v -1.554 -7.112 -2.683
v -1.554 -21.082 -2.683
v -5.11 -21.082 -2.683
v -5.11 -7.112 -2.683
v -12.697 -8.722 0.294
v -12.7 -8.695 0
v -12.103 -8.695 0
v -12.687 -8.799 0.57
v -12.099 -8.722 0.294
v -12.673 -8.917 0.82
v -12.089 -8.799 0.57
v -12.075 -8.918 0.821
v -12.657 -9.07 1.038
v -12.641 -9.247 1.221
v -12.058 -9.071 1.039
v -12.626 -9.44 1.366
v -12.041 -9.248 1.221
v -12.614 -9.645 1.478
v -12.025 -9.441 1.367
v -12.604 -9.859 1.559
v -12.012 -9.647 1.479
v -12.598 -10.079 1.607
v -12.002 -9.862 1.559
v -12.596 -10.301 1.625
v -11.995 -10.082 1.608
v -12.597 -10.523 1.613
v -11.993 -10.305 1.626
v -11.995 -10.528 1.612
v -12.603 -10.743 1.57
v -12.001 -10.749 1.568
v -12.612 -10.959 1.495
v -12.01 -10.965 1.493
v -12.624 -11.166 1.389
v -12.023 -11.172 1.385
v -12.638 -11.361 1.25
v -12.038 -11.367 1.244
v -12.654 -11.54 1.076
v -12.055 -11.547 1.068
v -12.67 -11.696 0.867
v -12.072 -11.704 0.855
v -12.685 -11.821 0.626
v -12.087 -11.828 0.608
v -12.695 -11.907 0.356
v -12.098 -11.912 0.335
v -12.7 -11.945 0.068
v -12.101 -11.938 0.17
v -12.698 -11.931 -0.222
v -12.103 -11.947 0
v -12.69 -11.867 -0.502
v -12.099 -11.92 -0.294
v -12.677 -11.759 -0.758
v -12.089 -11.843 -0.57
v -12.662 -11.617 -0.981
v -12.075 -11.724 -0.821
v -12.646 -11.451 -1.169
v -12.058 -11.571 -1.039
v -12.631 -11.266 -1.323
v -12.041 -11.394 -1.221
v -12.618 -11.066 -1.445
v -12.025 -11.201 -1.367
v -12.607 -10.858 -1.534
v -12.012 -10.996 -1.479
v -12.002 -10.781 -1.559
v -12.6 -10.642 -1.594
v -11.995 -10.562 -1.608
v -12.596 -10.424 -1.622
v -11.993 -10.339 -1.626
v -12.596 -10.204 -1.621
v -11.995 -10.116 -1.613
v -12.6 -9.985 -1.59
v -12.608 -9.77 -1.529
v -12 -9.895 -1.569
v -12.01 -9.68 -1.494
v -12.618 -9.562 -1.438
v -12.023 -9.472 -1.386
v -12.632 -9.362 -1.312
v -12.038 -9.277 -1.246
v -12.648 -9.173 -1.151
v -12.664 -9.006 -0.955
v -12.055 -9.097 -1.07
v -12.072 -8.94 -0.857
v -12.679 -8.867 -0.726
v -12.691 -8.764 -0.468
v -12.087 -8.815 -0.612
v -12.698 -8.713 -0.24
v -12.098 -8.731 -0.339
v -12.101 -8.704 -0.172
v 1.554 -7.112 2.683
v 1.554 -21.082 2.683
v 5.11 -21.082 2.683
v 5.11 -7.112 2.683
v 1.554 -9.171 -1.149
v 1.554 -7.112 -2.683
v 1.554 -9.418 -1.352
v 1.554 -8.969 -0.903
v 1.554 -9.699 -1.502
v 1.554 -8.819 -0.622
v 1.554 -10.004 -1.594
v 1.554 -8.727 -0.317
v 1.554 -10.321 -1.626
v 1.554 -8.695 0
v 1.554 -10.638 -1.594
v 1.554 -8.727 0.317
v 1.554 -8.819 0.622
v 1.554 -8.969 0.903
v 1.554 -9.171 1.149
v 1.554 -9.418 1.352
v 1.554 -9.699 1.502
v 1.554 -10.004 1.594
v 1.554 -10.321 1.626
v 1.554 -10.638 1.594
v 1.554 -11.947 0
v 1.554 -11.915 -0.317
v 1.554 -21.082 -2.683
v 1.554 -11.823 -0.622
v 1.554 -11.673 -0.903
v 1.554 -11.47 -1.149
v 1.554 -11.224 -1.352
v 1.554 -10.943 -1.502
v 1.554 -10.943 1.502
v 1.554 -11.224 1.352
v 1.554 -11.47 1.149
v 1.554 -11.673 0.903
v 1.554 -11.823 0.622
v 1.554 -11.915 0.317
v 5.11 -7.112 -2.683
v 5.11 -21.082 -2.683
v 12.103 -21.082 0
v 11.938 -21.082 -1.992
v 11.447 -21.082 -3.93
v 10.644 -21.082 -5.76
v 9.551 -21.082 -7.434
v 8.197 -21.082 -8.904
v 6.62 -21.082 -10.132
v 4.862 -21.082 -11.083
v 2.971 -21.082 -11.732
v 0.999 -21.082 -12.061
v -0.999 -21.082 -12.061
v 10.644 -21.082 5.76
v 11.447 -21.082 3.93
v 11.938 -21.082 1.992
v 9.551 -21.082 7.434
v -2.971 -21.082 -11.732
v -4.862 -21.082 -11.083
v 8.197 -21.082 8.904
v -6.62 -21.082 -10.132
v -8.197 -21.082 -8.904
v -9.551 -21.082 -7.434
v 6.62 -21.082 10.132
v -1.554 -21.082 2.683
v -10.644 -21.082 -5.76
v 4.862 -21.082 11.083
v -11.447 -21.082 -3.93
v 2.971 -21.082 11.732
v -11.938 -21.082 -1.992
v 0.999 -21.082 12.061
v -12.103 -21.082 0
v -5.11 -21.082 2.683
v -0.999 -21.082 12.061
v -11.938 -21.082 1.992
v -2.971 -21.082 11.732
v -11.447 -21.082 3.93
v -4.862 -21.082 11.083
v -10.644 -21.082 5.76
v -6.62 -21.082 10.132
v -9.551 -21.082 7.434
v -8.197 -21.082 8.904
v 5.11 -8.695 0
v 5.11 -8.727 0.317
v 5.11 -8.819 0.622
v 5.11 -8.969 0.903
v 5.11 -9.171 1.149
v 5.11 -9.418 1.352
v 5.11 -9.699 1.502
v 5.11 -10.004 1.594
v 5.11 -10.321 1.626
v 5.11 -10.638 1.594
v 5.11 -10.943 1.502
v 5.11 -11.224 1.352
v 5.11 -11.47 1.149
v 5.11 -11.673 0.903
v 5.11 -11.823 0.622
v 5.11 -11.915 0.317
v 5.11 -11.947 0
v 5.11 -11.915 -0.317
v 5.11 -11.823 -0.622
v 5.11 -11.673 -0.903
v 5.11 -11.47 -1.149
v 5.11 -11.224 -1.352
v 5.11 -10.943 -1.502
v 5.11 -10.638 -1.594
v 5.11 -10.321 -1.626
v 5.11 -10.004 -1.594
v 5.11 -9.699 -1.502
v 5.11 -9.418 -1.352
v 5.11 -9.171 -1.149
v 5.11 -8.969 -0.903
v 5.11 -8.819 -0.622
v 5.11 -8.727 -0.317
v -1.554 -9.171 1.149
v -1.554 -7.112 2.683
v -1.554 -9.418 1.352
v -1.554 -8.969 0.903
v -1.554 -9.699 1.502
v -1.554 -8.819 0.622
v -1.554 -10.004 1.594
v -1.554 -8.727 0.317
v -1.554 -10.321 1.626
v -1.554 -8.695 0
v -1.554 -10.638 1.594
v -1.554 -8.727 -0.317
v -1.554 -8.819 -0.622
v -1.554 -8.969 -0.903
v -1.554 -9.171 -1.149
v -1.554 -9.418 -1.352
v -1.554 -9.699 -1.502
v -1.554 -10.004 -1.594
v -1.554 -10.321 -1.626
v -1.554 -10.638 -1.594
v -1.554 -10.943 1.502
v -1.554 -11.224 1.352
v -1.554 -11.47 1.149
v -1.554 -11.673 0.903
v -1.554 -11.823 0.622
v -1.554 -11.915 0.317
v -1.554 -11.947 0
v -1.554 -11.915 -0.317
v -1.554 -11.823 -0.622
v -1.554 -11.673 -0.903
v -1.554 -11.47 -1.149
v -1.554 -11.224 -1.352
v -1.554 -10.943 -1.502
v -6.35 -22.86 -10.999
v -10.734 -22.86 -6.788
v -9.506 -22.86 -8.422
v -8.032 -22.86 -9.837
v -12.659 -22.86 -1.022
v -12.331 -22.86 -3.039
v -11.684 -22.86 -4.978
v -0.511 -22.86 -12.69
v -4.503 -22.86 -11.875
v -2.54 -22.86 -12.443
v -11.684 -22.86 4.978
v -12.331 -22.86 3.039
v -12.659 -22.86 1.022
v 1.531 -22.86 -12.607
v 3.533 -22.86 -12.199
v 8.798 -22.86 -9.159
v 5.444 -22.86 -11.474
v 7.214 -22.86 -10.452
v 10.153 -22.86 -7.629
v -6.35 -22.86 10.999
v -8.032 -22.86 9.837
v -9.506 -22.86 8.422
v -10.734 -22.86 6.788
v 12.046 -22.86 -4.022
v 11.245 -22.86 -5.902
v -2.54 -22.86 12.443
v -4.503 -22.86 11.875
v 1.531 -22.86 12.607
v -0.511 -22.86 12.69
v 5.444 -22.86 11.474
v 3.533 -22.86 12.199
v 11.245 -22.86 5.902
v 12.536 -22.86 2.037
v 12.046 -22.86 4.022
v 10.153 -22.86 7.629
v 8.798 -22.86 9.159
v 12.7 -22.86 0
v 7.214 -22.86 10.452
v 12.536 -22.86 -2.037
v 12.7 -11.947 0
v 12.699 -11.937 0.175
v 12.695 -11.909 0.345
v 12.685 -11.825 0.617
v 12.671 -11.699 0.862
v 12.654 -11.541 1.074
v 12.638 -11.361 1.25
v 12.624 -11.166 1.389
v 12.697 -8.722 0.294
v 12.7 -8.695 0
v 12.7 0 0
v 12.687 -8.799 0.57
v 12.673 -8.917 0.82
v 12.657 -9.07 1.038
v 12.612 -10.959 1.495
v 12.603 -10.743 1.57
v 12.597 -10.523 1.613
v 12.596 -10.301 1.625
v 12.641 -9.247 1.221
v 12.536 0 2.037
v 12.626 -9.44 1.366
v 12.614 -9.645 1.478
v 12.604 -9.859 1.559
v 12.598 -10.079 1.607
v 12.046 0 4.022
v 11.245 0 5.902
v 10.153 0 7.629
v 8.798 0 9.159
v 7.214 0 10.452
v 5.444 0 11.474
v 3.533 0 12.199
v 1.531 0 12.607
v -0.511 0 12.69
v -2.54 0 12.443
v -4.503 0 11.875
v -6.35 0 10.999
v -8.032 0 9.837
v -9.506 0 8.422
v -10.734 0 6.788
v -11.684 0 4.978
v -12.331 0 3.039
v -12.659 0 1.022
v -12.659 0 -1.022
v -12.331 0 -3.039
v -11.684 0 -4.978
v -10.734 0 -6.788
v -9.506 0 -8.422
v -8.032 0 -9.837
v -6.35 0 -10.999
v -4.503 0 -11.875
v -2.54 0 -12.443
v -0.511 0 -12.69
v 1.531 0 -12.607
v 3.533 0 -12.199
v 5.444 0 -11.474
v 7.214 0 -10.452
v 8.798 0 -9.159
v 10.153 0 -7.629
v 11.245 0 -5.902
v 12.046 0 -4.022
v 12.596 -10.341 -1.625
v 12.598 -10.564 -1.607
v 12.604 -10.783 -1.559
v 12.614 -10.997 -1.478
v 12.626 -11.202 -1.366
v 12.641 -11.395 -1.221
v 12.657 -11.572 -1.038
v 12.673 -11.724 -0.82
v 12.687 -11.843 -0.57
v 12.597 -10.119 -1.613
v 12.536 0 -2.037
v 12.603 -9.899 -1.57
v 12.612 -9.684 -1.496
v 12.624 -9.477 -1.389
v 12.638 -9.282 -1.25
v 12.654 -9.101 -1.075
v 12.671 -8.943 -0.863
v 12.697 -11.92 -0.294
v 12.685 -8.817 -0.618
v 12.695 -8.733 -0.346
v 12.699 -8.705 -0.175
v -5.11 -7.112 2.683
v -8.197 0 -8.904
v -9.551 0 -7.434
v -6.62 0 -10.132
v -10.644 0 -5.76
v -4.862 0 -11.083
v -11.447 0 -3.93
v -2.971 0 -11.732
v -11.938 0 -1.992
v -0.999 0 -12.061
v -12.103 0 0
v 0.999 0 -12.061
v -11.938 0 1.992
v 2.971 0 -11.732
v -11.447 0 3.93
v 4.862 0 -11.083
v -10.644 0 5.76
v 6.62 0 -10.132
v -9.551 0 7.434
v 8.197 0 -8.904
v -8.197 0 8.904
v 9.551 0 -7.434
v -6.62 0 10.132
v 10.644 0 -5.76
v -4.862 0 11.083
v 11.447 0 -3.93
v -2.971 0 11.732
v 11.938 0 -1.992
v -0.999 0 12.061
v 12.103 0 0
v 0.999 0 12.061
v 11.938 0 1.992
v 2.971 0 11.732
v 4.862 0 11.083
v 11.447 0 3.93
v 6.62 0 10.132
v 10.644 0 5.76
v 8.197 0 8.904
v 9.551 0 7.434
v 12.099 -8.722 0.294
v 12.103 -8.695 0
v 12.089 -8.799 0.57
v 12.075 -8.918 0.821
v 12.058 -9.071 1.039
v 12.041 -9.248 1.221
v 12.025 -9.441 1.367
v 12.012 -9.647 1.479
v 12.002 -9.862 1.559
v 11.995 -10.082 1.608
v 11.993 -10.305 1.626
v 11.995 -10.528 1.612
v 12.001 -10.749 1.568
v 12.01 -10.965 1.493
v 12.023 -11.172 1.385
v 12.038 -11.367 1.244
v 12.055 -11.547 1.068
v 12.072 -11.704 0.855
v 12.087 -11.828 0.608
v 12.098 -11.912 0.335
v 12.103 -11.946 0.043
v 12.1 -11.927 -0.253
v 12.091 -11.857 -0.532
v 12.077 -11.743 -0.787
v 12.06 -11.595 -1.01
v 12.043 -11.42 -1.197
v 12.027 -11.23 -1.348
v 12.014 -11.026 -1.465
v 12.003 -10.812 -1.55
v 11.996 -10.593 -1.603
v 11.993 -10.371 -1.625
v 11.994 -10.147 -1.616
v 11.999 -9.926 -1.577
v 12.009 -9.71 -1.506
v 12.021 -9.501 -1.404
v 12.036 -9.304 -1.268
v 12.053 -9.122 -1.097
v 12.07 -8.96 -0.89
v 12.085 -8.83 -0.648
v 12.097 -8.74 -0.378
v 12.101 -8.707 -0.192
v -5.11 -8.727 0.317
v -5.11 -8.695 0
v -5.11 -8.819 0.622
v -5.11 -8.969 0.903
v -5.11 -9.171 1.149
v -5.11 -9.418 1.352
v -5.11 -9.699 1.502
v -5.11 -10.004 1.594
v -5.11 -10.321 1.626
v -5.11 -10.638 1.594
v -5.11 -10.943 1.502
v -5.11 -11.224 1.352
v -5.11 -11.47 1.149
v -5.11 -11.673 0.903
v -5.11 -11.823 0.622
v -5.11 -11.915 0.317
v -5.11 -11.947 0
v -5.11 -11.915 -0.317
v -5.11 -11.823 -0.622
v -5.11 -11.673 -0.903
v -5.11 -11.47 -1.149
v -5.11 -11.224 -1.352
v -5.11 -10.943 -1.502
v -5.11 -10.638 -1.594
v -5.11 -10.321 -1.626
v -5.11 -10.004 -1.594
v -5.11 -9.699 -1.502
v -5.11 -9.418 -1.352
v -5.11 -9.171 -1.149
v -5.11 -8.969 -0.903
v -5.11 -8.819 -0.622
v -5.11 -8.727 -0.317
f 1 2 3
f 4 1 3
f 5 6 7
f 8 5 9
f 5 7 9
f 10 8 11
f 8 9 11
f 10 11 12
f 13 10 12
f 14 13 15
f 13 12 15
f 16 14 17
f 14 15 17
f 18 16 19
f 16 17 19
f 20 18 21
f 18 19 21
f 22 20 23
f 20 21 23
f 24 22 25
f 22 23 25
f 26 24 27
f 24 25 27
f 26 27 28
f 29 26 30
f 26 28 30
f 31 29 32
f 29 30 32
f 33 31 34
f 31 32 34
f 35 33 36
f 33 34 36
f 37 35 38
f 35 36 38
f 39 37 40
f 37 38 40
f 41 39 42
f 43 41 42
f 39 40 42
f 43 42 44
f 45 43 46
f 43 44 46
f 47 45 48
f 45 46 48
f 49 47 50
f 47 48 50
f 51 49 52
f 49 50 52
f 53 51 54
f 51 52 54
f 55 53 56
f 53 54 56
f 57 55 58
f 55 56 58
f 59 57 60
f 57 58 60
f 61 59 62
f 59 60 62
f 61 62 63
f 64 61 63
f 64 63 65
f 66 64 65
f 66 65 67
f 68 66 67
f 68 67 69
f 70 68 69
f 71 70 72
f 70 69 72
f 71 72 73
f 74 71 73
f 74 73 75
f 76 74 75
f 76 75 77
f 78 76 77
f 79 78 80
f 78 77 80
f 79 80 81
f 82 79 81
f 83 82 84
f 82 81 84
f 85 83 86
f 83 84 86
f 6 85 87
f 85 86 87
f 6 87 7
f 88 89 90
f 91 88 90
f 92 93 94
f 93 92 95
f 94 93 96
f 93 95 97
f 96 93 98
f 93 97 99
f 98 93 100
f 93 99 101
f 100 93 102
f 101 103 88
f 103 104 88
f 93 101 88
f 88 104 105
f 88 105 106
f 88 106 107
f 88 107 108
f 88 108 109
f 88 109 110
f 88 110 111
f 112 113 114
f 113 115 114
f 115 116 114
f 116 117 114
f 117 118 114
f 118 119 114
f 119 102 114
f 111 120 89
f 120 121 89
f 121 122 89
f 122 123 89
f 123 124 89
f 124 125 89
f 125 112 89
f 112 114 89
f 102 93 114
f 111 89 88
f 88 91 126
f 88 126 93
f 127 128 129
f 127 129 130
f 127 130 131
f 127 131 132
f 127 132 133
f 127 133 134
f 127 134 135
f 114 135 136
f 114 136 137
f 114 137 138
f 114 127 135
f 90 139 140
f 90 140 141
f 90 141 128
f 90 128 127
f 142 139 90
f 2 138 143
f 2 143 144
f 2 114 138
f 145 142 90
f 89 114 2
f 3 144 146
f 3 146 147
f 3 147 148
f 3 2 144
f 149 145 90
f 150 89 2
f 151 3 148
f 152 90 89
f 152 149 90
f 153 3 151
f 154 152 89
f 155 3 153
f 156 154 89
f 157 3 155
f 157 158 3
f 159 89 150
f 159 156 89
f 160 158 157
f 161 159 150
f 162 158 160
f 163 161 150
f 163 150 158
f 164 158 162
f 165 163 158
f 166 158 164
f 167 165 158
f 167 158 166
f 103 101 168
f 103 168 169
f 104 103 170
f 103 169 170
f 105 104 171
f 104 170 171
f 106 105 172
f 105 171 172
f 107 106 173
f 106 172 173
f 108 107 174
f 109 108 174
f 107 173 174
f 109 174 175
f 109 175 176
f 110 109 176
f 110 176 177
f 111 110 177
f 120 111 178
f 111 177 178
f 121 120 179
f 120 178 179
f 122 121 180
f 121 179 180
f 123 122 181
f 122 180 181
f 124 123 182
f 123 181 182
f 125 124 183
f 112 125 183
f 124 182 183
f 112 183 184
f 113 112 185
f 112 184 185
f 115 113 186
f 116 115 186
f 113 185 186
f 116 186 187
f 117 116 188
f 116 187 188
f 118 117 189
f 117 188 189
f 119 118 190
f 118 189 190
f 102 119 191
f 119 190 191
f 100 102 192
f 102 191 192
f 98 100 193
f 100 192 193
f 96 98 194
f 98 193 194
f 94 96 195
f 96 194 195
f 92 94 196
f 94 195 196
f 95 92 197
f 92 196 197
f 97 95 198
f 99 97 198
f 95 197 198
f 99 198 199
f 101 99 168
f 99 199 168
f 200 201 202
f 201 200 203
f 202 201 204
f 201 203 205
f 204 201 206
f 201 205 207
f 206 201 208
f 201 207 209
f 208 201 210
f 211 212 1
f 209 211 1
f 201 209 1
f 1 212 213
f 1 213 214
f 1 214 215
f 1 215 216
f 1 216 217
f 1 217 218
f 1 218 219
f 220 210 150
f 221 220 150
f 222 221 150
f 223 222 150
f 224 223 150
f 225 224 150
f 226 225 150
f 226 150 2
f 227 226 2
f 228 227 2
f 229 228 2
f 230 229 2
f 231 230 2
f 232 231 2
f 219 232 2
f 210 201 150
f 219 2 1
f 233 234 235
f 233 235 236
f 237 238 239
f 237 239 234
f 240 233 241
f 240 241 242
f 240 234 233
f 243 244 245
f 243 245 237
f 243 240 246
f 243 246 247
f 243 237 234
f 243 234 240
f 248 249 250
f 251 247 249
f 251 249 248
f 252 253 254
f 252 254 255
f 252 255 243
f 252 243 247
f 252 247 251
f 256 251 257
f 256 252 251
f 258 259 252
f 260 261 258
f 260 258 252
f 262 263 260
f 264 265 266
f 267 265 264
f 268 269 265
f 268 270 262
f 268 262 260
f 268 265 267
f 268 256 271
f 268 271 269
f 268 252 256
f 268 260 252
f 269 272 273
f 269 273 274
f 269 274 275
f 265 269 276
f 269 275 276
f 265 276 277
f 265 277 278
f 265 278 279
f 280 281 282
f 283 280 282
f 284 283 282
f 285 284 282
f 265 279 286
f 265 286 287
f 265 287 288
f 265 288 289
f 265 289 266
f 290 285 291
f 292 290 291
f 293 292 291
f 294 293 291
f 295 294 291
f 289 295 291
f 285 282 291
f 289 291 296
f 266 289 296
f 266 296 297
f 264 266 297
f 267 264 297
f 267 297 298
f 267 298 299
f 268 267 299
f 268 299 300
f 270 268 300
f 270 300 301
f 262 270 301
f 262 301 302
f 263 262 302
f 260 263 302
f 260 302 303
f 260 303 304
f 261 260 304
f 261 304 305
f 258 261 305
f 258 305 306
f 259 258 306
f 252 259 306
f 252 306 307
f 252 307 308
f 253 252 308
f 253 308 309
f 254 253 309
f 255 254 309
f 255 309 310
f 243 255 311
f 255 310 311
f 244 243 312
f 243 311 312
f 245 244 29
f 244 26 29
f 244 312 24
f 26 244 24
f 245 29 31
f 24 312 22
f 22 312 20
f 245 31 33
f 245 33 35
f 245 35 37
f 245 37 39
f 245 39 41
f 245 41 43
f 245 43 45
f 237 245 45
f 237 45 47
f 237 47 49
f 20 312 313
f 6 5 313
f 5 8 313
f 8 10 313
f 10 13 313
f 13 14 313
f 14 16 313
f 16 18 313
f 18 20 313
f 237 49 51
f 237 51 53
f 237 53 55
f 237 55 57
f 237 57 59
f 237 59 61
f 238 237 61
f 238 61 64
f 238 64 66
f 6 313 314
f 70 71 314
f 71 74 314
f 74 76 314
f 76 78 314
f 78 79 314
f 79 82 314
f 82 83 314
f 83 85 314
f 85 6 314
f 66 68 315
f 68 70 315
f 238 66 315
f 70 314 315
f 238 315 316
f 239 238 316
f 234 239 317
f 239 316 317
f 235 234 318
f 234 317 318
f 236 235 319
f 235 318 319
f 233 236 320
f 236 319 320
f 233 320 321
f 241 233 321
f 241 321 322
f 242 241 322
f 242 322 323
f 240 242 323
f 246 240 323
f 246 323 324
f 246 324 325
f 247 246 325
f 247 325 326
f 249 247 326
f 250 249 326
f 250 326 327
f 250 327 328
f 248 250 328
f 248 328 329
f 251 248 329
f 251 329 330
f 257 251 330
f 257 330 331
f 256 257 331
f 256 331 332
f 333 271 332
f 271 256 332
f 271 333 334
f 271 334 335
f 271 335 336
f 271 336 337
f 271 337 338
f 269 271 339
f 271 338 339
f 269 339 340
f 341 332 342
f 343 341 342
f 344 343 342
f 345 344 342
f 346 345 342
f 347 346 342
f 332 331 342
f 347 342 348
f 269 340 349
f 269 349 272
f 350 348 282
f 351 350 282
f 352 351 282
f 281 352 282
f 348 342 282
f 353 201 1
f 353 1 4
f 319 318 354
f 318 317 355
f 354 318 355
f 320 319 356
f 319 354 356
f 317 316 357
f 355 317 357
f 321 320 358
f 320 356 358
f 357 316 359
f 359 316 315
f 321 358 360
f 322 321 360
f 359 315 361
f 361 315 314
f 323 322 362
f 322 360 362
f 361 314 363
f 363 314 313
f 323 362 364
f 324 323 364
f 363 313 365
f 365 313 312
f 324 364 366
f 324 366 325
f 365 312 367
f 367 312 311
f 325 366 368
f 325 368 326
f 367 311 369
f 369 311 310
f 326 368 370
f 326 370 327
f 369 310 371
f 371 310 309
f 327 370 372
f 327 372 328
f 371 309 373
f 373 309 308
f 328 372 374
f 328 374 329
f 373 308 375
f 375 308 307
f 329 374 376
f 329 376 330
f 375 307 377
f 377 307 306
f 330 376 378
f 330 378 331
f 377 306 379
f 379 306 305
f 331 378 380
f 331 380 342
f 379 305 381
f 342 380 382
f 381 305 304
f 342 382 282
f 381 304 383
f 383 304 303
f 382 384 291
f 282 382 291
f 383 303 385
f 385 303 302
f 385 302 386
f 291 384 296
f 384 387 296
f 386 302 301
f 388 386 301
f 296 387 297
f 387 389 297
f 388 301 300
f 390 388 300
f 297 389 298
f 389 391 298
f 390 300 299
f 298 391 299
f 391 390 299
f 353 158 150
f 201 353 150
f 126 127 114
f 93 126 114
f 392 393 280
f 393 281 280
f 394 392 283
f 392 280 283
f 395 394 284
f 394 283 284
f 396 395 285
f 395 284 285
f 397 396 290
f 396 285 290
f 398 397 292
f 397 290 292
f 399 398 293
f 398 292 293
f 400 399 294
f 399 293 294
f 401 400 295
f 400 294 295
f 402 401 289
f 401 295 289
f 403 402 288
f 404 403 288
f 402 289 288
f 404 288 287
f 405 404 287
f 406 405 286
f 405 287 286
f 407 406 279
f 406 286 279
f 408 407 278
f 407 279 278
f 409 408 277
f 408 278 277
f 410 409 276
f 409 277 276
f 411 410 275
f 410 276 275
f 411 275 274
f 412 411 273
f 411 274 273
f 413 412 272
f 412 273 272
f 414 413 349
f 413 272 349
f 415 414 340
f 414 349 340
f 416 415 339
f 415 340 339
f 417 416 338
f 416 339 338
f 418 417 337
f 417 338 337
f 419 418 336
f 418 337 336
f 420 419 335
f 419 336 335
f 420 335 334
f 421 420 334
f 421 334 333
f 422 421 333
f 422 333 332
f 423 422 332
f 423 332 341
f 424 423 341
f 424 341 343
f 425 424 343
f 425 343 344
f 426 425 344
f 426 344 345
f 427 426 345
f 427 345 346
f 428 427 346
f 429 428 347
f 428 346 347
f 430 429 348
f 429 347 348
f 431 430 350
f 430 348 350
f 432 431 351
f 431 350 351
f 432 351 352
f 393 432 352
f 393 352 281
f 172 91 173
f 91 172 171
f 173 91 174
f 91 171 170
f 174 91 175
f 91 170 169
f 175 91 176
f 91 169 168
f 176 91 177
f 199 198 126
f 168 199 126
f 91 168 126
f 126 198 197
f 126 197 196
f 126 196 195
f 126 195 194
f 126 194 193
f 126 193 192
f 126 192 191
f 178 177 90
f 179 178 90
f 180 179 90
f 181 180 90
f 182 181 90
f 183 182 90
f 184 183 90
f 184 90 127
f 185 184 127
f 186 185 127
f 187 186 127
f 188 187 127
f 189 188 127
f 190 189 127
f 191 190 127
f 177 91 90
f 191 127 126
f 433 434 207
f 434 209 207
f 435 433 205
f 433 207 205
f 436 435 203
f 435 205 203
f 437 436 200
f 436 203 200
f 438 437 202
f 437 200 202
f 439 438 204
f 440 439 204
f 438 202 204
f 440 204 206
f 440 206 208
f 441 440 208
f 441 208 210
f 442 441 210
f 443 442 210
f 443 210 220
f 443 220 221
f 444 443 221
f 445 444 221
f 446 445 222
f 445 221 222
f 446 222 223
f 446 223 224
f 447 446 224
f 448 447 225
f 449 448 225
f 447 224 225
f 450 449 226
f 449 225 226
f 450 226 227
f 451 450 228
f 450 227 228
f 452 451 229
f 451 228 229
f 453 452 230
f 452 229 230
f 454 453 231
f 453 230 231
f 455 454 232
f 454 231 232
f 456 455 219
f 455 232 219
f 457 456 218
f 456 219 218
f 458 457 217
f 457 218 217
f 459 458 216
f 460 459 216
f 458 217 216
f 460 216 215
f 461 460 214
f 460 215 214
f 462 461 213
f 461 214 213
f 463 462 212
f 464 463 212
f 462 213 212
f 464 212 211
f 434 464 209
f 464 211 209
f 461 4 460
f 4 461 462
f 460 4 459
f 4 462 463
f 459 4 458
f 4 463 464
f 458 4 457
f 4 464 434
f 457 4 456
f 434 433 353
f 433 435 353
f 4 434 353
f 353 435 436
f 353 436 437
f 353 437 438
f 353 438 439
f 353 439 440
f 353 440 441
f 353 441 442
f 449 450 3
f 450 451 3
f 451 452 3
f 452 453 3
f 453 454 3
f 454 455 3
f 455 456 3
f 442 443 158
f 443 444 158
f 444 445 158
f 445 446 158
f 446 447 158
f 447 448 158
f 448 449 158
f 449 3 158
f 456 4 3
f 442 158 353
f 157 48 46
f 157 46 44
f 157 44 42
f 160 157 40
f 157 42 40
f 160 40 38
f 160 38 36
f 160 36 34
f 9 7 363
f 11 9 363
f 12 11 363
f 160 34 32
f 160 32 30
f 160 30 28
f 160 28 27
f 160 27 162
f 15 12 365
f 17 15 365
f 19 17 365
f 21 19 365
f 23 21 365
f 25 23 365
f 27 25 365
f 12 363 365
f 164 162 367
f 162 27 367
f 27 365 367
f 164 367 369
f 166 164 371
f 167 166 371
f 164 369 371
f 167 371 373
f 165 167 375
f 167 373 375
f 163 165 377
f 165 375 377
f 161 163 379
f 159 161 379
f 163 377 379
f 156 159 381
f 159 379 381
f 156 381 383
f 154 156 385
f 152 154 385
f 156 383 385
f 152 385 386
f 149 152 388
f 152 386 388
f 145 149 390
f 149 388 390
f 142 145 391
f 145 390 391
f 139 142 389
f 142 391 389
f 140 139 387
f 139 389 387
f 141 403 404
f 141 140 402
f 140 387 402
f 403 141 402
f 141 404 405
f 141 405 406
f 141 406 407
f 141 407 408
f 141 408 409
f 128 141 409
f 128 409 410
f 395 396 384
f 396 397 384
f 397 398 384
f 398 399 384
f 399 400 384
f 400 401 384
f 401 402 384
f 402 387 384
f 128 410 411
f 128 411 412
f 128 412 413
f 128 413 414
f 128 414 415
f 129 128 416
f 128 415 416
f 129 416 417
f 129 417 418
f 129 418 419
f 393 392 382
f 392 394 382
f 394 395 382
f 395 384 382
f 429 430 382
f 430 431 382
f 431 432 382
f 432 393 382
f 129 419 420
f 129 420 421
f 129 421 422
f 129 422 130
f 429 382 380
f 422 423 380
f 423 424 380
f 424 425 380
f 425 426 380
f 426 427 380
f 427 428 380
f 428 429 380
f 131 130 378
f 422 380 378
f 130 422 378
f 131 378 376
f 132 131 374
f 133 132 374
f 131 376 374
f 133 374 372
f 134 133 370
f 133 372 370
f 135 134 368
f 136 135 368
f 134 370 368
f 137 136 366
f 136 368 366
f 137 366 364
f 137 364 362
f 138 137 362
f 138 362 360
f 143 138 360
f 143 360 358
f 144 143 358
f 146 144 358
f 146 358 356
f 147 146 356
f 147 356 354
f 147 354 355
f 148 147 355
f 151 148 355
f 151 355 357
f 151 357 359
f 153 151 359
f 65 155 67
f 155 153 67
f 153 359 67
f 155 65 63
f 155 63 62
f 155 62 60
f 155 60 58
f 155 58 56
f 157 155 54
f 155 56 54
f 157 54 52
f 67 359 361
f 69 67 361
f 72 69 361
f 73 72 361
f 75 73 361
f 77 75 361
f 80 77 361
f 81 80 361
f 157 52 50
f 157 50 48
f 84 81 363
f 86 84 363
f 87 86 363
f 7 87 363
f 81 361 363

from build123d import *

# Parameters (mm, degrees)
F0_R     = 12.7
F1_DEPTH = 22.86
F2_R     = 12.102618
F3_DEPTH = 21.082
F5_DEPTH = 13.97
F6_R     = 1.6256
F7_DEPTH = 12.7


with BuildPart() as f1:
    # F0 (on Front) → F1 (new body)
    with BuildSketch(Plane.XZ):
        Circle(F0_R)
    extrude(amount=F1_DEPTH)

    # F2 (on face) → F3 (cut)
    with BuildSketch(Plane(origin=(0, 0, 0), x_dir=(-1, 0, 0), z_dir=(0, 1, 0))):
        Circle(F2_R)
    extrude(amount=-F3_DEPTH, mode=Mode.SUBTRACT)

    # F4 (on face) → F5 (join)
    with BuildSketch(Plane(origin=(0, -21.082, 0), x_dir=(-1, 0, 0), z_dir=(0, 1, 0))):
        Polygon((-1.553707, 2.682939), (-5.109707, 2.682939), (-5.109707, 0), (-5.109707, -2.682939), (-1.553707, -2.682939), (-1.553707, 0), align=None)
        Polygon((1.553707, 2.682939), (1.553707, 0), (1.553707, -2.682939), (5.109707, -2.682939), (5.109707, 0), (5.109707, 2.682939), align=None)
    extrude(amount=F5_DEPTH)

    # F6 (on Right) → F7 (cut, symmetric)
    with BuildSketch(Plane.YZ):
        with Locations((-10.320932, 0)):
            Circle(F6_R)
    extrude(amount=F7_DEPTH, both=True, mode=Mode.SUBTRACT)


solid = f1.part
